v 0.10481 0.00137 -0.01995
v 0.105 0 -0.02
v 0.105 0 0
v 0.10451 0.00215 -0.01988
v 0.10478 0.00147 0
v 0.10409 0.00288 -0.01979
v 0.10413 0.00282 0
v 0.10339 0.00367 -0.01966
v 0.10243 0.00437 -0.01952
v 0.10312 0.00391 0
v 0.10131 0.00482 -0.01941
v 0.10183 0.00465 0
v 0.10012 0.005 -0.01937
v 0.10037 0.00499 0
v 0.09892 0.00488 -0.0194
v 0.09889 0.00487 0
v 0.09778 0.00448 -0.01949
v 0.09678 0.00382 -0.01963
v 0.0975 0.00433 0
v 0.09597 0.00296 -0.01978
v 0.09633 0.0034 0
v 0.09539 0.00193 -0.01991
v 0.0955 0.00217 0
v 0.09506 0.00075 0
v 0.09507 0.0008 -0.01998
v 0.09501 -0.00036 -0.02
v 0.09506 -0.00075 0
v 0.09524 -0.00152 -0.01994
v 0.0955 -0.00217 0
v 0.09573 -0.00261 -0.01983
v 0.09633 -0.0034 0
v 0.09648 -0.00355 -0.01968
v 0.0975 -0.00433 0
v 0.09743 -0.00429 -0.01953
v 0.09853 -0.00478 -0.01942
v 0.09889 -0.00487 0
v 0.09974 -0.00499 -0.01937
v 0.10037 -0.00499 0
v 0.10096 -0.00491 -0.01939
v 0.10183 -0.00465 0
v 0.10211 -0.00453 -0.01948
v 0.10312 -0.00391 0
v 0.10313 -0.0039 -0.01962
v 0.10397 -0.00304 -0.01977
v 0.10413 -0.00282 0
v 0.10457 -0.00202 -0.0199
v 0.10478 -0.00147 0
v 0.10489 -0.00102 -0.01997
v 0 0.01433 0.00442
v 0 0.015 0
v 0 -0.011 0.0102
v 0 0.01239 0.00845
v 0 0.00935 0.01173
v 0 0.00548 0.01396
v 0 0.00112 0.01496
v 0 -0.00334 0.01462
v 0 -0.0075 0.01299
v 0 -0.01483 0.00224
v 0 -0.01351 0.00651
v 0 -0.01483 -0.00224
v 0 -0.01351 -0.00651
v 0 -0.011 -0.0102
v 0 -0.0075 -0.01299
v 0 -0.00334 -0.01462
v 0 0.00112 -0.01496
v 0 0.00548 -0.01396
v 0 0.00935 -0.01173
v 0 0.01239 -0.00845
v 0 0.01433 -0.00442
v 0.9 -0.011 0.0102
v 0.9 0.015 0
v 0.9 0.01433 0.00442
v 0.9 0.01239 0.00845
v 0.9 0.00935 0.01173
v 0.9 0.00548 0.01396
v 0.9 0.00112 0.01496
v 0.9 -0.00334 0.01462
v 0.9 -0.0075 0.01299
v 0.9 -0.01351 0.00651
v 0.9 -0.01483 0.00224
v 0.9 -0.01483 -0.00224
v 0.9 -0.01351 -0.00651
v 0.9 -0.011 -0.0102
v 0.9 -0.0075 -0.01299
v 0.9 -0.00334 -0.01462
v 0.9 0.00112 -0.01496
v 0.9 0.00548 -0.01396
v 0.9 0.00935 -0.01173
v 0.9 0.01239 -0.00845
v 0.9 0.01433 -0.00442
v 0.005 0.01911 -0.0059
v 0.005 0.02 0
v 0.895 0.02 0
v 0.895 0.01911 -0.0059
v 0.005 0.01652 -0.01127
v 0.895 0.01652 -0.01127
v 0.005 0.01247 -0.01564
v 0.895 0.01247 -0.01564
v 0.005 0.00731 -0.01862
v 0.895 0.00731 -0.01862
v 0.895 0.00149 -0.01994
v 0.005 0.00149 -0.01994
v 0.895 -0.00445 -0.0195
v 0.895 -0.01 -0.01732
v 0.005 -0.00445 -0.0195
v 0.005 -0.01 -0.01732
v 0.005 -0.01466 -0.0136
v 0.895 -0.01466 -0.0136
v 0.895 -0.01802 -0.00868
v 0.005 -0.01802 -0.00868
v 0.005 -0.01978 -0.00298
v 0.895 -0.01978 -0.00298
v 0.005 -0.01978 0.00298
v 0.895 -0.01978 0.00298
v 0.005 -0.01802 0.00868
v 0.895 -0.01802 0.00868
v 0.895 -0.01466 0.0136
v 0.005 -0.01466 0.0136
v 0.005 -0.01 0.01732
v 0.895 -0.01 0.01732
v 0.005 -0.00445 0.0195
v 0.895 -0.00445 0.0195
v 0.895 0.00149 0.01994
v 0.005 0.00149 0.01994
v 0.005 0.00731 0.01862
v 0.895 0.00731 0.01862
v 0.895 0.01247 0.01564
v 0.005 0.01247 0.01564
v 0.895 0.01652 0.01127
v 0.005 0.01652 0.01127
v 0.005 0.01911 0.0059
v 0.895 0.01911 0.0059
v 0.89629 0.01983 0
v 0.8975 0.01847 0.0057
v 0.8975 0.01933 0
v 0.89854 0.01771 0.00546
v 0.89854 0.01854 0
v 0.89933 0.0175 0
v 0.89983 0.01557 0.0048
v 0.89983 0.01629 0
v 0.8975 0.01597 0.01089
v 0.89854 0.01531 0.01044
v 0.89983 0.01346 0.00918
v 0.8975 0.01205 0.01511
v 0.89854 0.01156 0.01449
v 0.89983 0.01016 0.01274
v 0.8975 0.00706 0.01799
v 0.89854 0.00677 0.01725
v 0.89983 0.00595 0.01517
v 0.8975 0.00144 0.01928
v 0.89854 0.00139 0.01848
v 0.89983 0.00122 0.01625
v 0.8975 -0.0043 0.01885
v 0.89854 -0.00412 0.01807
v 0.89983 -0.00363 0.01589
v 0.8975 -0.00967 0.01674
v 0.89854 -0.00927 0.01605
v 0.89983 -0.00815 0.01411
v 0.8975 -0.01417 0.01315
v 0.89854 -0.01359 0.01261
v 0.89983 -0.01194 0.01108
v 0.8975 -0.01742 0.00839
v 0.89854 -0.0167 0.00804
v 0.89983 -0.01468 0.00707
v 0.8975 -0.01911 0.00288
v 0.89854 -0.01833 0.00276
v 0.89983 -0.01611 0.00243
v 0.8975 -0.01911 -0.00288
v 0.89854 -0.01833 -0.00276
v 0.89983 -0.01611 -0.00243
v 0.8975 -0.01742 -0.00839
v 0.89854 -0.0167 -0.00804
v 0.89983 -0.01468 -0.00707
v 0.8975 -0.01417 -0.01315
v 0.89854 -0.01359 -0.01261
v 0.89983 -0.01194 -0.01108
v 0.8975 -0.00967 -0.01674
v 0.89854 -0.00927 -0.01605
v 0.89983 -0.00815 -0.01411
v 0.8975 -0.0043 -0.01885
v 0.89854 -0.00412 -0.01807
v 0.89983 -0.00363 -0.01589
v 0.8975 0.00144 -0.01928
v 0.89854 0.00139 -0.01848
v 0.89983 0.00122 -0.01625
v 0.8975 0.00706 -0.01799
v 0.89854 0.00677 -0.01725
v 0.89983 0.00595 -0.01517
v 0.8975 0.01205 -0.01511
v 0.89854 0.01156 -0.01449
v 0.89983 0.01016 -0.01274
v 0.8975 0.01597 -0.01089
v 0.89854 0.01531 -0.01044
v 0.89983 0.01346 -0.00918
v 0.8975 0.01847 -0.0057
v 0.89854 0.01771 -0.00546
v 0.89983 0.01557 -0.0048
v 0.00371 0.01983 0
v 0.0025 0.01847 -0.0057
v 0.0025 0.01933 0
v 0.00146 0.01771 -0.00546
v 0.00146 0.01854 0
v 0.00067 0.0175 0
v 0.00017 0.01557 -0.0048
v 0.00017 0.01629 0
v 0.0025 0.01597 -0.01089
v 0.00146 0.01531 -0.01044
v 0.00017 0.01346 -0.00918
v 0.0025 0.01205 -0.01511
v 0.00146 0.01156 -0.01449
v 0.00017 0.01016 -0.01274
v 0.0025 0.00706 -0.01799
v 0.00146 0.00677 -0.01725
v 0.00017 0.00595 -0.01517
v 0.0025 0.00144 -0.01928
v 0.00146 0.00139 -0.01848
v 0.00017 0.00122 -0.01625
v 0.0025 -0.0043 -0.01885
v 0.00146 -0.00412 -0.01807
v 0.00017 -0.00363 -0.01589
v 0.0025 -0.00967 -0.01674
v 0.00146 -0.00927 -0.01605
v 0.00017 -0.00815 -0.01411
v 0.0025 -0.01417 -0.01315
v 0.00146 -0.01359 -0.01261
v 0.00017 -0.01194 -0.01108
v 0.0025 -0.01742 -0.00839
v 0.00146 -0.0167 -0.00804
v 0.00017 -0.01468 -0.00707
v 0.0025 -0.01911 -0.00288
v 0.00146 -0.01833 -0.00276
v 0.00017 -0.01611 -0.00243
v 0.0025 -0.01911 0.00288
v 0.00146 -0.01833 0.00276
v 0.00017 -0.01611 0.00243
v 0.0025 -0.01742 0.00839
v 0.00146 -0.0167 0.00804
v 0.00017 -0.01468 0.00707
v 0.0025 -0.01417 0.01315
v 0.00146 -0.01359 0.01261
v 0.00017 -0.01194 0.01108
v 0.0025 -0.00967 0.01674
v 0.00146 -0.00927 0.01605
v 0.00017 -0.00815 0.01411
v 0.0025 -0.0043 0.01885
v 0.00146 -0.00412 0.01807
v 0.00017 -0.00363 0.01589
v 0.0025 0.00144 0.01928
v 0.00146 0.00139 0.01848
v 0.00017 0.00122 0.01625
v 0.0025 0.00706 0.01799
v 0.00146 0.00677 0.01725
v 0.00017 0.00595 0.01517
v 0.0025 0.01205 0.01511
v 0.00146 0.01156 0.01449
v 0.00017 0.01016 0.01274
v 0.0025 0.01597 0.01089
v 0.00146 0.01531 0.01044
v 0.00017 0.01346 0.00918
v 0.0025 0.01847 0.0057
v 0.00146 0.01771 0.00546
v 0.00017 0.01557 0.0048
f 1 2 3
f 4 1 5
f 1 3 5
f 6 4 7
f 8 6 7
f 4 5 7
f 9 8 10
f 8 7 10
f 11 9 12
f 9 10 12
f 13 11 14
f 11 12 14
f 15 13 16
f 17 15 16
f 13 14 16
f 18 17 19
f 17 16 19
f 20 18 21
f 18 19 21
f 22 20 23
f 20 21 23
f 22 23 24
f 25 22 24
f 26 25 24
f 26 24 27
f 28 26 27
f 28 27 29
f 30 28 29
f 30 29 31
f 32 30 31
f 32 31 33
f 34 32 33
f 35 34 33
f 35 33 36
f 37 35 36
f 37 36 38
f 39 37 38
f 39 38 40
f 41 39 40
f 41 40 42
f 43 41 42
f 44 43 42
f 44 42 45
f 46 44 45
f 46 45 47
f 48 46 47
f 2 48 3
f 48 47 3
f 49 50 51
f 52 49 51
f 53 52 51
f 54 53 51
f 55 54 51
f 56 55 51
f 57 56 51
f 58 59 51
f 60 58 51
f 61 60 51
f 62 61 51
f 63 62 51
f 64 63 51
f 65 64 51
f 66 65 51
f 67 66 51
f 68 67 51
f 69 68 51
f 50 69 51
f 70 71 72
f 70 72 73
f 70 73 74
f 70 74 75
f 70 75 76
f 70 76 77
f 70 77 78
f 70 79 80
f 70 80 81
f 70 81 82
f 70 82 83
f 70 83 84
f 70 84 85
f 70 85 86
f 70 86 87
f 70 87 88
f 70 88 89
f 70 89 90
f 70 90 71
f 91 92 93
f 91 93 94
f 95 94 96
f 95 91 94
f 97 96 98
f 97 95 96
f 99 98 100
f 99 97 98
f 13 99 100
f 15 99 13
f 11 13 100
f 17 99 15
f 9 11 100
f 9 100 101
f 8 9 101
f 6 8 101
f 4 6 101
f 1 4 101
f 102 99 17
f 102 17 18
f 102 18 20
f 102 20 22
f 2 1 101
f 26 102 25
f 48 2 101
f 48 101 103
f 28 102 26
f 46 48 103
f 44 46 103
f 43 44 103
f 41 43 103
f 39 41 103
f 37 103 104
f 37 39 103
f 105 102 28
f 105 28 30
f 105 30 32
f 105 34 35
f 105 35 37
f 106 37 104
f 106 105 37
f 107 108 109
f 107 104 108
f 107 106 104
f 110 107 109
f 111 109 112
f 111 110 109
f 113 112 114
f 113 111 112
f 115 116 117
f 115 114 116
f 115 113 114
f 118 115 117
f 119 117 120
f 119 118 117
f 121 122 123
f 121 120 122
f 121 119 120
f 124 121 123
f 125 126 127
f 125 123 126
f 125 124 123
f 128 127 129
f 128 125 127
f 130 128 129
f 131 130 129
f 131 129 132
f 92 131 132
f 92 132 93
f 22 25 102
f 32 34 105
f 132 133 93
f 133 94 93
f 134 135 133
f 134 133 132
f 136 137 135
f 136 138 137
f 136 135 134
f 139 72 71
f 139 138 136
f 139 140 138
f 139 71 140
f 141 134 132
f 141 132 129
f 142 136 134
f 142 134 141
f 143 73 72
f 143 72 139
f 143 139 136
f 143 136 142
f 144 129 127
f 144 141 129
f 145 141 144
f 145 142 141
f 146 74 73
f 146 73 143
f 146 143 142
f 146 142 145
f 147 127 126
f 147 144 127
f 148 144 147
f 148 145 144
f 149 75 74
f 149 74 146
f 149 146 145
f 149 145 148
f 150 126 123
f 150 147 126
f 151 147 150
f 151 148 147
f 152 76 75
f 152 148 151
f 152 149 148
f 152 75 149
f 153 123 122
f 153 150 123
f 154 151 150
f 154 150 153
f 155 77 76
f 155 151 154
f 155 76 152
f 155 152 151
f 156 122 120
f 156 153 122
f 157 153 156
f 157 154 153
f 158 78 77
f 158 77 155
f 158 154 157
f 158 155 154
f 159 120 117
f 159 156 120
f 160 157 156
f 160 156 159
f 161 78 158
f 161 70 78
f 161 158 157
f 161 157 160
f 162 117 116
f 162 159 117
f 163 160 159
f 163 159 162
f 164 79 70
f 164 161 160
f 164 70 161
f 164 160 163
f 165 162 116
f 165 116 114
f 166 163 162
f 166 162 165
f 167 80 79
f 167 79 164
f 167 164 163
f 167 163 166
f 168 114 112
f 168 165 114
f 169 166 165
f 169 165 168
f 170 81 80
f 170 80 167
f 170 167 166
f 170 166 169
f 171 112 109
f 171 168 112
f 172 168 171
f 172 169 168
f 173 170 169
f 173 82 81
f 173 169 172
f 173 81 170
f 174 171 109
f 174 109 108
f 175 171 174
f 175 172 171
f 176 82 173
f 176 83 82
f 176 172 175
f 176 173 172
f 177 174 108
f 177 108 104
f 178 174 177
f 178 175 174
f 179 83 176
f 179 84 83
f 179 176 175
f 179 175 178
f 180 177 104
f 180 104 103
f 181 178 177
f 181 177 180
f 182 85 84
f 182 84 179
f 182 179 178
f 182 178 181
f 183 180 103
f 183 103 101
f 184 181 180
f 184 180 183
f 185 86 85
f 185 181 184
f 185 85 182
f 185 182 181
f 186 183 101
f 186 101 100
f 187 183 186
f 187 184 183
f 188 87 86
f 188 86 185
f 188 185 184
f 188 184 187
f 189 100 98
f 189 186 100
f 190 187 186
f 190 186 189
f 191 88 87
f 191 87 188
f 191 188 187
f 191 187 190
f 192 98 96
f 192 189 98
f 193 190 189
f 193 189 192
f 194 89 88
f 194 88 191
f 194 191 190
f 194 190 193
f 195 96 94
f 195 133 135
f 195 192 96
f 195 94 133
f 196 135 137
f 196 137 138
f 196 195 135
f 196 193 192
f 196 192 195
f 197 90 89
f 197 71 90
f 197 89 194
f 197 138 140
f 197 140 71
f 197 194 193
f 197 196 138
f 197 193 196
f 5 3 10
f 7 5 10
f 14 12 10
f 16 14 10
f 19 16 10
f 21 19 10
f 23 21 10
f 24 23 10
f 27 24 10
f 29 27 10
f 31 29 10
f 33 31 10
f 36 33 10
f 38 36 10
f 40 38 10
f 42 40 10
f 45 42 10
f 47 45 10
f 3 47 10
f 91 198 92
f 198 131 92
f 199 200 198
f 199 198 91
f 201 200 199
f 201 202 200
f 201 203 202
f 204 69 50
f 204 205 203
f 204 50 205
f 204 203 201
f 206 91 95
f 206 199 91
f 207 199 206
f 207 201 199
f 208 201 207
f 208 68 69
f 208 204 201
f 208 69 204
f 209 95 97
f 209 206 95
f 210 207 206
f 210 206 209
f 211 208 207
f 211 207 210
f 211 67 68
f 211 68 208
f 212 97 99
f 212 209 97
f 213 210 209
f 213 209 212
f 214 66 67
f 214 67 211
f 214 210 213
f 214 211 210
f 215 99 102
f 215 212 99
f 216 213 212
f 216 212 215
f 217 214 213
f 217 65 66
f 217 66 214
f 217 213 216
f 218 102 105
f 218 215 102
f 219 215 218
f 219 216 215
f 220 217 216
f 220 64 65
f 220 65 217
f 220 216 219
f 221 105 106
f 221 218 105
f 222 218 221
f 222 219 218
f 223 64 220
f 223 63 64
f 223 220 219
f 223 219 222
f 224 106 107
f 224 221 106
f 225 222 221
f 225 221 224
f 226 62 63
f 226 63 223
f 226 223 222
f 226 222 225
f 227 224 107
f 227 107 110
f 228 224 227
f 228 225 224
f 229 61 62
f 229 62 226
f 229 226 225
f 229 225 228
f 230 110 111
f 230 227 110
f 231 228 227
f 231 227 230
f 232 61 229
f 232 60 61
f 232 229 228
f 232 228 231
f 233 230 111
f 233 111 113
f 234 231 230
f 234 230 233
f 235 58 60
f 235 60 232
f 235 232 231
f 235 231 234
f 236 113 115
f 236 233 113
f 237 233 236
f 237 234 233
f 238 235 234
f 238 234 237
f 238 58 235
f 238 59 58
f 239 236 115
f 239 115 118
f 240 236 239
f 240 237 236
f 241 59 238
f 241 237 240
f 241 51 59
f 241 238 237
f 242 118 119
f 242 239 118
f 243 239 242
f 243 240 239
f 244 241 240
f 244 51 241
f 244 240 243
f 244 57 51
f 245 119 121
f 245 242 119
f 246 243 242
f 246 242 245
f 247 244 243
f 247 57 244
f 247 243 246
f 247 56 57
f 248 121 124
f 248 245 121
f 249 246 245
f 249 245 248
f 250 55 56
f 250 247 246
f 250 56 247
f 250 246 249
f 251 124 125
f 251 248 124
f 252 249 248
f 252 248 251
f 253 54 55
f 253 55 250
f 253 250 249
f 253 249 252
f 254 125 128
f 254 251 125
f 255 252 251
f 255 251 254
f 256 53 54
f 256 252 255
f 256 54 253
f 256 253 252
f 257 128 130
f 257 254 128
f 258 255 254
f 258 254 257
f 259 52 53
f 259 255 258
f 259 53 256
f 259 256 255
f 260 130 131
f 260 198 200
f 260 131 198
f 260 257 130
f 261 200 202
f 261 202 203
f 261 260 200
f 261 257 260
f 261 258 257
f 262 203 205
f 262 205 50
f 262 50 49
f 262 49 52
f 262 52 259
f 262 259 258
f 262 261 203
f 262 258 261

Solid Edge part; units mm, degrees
sketch "Sketch1" plane through (0, 0, 0) normal (1, 0, 0) x (0, 1, 0)
  circle A0 centre (0, 0) radius 0.02
  dimension "D1" = 0.04
extrude "Protrusion1" add sketch "Sketch1" along normal blind 0.9
fillet "Verrundung_1" radius 0.005 2 edges at (0, -0.02, 0) (0.9, -0.02, 0)
sketch "Sketch2" plane through (0, 0, 0) normal (0, 0, 1) x (1, 0, 0)
  circle A0 centre (0.1, 0) radius 0.005
  dimension "D1" = 0.1
  dimension "D2" = 0.01
extrude "Cutout1" cut sketch "Sketch2" against normal through all
